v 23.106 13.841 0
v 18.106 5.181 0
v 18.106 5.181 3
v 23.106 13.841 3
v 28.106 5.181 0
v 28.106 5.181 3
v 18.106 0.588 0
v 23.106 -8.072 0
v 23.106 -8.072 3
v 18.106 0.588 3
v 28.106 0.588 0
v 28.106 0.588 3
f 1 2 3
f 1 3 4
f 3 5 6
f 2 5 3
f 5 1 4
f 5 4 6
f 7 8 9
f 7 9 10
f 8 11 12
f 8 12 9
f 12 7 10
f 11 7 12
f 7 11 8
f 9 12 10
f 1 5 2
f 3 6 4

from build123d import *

# Parameters (mm, degrees)
BOSS_EXTRUDE1_DEPTH   = 3
BOSS_EXTRUDE1_2_DEPTH = 3


with BuildPart() as part:
    # Sketch1 → Boss-Extrude1 (new body)
    with BuildSketch(Plane.XY):
        Polygon((18.106270862, 5.181175532), (23.106270862, 13.84142957), (28.106270862, 5.181175532), align=None)
    extrude(amount=BOSS_EXTRUDE1_DEPTH)


with BuildPart() as body_2:
    # Sketch1 → Boss-Extrude1 2 (new body)
    with BuildSketch(Plane.XY):
        Polygon((18.106270862, 0.588179711), (28.106270862, 0.588179711), (23.106270862, -8.072074327), align=None)
    extrude(amount=BOSS_EXTRUDE1_2_DEPTH)


solid = Compound([part.part, body_2.part])
